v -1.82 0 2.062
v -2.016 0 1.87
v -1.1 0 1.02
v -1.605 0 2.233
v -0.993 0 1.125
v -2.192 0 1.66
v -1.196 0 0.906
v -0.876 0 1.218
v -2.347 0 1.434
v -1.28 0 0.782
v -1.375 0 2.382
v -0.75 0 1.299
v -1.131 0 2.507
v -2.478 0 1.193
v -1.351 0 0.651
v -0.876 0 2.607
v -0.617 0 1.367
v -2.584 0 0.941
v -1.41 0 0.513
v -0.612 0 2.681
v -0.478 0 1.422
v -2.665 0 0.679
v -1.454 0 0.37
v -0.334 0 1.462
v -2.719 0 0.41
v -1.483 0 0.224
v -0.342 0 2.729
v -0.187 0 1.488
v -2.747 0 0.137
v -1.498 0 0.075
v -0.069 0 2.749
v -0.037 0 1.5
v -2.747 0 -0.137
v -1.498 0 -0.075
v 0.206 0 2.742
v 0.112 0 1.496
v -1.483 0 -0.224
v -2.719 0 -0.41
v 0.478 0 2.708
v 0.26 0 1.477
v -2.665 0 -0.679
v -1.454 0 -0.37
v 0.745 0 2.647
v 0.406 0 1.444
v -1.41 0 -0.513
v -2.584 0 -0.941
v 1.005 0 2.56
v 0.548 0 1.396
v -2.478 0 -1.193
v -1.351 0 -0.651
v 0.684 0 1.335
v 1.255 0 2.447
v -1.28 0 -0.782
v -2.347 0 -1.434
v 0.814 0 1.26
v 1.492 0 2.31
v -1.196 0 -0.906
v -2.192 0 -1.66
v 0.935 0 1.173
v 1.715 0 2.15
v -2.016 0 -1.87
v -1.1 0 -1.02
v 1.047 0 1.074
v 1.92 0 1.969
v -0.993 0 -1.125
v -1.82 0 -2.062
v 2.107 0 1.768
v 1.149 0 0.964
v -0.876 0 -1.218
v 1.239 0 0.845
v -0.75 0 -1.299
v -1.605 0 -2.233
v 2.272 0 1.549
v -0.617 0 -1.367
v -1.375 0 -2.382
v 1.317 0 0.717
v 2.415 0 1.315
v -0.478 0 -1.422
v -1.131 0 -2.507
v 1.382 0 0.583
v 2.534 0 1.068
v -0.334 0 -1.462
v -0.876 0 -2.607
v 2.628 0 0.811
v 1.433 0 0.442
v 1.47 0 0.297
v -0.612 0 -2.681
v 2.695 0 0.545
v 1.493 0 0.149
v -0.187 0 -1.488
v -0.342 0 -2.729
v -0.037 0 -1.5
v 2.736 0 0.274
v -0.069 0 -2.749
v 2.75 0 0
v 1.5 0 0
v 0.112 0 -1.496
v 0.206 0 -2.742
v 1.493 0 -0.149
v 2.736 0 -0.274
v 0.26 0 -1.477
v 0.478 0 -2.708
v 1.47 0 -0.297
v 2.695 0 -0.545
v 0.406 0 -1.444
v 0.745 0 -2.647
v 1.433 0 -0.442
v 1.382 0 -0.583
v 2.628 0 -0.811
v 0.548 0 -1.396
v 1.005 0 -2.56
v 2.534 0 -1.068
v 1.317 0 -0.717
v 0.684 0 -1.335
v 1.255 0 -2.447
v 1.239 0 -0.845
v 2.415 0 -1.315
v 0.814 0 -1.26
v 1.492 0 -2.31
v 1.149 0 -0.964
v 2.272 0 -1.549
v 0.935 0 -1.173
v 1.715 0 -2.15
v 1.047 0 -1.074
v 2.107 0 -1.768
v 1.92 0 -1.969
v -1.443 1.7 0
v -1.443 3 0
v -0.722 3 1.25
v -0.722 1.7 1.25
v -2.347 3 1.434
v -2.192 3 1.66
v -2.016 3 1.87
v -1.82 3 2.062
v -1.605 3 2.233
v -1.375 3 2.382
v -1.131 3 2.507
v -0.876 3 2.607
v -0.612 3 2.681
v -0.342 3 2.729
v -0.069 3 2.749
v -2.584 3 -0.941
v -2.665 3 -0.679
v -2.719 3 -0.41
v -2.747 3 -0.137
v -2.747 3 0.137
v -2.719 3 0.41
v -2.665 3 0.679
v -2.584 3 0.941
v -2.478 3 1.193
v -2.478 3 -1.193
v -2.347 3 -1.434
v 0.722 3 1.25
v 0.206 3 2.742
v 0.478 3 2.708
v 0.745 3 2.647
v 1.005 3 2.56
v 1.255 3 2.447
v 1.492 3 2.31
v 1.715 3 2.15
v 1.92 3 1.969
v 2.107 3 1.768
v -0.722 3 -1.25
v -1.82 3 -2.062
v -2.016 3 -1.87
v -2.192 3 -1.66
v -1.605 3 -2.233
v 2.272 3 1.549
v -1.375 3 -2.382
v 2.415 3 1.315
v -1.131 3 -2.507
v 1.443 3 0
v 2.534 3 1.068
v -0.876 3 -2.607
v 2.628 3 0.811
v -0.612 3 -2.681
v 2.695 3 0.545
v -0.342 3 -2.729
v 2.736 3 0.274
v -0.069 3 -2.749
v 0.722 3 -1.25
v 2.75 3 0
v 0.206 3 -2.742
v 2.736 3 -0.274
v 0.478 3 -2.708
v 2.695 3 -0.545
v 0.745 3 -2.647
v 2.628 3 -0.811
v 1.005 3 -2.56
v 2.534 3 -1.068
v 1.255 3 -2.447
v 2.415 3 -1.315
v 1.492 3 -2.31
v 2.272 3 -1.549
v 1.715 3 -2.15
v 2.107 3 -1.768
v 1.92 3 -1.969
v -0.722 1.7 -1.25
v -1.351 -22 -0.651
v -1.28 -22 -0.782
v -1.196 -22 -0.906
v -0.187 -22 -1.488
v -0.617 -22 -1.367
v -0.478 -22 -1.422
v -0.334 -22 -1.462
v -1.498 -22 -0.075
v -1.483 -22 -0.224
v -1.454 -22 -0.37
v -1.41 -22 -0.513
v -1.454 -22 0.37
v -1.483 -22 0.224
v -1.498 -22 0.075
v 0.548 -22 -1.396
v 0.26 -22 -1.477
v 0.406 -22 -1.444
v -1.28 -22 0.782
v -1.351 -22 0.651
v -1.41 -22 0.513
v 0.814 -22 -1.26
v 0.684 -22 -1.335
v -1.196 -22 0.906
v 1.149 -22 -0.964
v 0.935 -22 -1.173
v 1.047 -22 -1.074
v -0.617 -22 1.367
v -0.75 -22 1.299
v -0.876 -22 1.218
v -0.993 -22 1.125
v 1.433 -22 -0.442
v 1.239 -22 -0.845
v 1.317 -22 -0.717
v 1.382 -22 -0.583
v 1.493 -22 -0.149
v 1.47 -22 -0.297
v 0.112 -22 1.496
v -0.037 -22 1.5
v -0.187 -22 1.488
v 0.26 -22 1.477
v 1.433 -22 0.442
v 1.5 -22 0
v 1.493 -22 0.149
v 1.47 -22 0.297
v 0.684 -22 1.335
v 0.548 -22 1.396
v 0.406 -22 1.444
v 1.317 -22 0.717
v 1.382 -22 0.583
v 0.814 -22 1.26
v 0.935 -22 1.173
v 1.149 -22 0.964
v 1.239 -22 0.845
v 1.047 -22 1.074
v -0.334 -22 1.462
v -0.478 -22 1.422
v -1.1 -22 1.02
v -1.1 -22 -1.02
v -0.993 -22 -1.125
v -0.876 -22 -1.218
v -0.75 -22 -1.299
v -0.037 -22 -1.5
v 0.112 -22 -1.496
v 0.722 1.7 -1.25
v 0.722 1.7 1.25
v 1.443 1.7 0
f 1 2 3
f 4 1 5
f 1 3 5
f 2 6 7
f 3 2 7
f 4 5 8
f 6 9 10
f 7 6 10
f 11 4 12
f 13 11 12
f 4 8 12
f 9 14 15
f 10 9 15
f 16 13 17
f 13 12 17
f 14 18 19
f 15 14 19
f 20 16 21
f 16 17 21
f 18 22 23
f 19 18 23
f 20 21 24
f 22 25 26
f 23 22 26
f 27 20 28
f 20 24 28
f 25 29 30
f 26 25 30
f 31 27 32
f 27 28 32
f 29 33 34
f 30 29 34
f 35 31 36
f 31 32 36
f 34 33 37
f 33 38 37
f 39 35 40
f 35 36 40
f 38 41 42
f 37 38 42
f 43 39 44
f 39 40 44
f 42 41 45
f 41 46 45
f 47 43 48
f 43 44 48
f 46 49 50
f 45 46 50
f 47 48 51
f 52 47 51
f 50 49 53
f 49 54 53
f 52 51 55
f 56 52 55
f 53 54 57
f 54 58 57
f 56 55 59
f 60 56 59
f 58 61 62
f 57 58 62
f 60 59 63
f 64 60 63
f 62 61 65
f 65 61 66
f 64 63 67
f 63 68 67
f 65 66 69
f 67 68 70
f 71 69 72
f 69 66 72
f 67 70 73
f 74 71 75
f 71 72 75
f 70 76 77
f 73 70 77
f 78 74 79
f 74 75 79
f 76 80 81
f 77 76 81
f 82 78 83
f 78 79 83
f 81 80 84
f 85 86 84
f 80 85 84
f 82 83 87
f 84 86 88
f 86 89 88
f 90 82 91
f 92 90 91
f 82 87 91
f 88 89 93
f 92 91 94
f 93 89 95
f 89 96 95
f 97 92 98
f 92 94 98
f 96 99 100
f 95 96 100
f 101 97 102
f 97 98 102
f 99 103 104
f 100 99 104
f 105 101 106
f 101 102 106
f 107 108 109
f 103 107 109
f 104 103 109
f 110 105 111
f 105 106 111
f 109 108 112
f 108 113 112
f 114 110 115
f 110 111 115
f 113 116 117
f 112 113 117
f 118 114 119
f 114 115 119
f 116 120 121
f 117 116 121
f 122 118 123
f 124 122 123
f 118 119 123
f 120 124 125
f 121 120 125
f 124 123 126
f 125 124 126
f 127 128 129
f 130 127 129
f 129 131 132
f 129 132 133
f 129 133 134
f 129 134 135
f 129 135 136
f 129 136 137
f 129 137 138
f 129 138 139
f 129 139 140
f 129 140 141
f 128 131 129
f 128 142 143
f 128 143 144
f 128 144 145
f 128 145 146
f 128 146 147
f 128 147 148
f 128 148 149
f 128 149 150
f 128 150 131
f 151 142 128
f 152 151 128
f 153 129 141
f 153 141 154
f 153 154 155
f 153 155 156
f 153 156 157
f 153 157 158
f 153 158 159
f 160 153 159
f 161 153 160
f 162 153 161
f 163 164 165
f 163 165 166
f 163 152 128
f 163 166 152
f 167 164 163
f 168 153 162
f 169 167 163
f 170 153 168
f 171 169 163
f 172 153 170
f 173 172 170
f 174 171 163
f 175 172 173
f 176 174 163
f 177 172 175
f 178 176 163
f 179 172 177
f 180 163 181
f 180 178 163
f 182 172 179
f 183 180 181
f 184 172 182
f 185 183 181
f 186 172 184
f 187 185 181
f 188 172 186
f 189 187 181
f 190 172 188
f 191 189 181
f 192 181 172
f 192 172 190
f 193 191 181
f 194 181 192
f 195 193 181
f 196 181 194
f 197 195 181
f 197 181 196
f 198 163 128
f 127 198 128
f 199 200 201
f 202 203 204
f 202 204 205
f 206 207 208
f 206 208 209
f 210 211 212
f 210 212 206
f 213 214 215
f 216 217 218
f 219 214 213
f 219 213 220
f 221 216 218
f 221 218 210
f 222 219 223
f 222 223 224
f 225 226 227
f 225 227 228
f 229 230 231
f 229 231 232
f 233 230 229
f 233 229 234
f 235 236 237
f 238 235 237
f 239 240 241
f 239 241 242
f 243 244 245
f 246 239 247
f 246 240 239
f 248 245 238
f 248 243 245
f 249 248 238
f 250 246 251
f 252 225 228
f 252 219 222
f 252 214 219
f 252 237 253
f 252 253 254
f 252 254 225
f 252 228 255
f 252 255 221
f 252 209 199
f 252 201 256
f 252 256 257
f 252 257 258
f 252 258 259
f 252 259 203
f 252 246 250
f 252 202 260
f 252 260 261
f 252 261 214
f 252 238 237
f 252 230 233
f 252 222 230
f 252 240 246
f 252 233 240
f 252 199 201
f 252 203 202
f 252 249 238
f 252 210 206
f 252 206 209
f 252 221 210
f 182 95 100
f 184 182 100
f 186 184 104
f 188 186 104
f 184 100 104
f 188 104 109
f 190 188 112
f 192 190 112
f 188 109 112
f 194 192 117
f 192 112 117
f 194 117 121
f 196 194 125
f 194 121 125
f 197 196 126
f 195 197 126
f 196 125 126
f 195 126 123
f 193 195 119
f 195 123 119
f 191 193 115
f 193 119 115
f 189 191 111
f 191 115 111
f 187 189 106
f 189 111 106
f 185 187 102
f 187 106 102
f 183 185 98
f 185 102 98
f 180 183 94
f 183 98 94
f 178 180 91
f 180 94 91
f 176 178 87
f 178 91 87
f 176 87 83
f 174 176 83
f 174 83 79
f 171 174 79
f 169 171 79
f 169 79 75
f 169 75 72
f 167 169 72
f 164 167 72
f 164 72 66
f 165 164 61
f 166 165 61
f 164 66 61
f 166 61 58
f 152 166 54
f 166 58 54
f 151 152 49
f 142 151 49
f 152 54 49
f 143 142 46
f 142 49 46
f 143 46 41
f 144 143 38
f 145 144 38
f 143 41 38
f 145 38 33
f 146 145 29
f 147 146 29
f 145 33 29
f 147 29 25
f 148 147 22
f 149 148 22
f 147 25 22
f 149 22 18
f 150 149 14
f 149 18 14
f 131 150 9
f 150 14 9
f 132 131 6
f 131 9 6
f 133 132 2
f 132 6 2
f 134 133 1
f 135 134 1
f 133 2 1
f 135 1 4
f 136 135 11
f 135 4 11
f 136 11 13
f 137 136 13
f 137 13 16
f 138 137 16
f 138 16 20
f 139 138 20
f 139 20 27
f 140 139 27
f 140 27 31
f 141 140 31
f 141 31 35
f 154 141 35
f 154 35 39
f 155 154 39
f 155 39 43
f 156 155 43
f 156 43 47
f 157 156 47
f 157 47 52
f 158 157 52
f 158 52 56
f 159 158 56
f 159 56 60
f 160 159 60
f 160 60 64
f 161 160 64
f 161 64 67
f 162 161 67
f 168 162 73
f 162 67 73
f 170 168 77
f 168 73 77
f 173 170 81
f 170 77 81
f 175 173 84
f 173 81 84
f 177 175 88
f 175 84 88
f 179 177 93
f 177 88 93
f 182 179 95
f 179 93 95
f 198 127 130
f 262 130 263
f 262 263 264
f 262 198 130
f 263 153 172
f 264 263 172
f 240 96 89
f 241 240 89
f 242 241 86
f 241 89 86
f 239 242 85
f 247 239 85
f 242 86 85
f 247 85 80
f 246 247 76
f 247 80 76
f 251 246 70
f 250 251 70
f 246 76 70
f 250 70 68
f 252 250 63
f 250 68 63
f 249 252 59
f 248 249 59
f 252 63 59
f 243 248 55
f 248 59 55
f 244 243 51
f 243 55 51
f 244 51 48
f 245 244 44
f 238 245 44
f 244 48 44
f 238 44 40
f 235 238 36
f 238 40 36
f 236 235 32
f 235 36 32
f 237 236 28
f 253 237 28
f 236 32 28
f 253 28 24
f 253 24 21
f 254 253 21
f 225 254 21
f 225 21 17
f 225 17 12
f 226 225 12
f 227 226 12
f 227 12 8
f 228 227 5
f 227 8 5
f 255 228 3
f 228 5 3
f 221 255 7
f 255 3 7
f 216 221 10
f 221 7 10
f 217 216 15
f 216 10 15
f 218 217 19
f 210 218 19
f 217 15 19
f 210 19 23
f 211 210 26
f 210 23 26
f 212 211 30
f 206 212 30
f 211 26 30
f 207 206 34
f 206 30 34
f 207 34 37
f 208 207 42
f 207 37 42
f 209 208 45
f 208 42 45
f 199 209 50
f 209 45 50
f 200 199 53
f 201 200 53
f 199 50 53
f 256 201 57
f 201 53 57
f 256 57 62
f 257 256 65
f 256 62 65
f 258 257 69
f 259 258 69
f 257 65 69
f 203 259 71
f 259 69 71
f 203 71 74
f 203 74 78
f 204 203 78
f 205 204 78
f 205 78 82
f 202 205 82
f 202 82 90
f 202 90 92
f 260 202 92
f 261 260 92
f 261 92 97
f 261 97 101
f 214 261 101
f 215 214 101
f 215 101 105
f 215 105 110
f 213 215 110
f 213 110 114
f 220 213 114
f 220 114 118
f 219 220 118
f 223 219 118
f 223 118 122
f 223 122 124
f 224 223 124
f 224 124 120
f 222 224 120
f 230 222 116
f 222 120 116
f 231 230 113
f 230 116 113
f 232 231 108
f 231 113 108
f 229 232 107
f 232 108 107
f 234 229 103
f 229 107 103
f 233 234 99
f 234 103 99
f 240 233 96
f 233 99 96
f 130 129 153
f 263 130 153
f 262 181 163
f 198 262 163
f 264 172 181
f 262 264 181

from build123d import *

# Parameters (mm, degrees)
SKETCH_1_R            = 2.75
EXTRUDE_248_DEPTH     = 3
CUT_EXTRUDE_378_DEPTH = 1.3
SKETCH_3_R            = 1.5
EXTRUDE_479_DEPTH     = 22


with BuildPart() as part:
    # 草图1 → Extrude 248 (new body)
    with BuildSketch(Plane(origin=(0, 0, 0), x_dir=(1, 0, 0), z_dir=(0, 1, 0))):
        Circle(SKETCH_1_R)
    extrude(amount=EXTRUDE_248_DEPTH)

    # 草图2 → Cut-Extrude 378 (cut)
    with BuildSketch(Plane(origin=(0, 3, 0), x_dir=(1, 0, 0), z_dir=(0, 1, 0))):
        Polygon((1.443375673, 0), (0.721687836, 1.25), (-0.721687836, 1.25), (-1.443375673, 0), (-0.721687836, -1.25), (0.721687836, -1.25), align=None)
    extrude(amount=-CUT_EXTRUDE_378_DEPTH, mode=Mode.SUBTRACT)

    # 草图3 → Extrude 479 (add)
    with BuildSketch(Plane.XZ):
        Circle(SKETCH_3_R)
    extrude(amount=EXTRUDE_479_DEPTH)


solid = part.part
